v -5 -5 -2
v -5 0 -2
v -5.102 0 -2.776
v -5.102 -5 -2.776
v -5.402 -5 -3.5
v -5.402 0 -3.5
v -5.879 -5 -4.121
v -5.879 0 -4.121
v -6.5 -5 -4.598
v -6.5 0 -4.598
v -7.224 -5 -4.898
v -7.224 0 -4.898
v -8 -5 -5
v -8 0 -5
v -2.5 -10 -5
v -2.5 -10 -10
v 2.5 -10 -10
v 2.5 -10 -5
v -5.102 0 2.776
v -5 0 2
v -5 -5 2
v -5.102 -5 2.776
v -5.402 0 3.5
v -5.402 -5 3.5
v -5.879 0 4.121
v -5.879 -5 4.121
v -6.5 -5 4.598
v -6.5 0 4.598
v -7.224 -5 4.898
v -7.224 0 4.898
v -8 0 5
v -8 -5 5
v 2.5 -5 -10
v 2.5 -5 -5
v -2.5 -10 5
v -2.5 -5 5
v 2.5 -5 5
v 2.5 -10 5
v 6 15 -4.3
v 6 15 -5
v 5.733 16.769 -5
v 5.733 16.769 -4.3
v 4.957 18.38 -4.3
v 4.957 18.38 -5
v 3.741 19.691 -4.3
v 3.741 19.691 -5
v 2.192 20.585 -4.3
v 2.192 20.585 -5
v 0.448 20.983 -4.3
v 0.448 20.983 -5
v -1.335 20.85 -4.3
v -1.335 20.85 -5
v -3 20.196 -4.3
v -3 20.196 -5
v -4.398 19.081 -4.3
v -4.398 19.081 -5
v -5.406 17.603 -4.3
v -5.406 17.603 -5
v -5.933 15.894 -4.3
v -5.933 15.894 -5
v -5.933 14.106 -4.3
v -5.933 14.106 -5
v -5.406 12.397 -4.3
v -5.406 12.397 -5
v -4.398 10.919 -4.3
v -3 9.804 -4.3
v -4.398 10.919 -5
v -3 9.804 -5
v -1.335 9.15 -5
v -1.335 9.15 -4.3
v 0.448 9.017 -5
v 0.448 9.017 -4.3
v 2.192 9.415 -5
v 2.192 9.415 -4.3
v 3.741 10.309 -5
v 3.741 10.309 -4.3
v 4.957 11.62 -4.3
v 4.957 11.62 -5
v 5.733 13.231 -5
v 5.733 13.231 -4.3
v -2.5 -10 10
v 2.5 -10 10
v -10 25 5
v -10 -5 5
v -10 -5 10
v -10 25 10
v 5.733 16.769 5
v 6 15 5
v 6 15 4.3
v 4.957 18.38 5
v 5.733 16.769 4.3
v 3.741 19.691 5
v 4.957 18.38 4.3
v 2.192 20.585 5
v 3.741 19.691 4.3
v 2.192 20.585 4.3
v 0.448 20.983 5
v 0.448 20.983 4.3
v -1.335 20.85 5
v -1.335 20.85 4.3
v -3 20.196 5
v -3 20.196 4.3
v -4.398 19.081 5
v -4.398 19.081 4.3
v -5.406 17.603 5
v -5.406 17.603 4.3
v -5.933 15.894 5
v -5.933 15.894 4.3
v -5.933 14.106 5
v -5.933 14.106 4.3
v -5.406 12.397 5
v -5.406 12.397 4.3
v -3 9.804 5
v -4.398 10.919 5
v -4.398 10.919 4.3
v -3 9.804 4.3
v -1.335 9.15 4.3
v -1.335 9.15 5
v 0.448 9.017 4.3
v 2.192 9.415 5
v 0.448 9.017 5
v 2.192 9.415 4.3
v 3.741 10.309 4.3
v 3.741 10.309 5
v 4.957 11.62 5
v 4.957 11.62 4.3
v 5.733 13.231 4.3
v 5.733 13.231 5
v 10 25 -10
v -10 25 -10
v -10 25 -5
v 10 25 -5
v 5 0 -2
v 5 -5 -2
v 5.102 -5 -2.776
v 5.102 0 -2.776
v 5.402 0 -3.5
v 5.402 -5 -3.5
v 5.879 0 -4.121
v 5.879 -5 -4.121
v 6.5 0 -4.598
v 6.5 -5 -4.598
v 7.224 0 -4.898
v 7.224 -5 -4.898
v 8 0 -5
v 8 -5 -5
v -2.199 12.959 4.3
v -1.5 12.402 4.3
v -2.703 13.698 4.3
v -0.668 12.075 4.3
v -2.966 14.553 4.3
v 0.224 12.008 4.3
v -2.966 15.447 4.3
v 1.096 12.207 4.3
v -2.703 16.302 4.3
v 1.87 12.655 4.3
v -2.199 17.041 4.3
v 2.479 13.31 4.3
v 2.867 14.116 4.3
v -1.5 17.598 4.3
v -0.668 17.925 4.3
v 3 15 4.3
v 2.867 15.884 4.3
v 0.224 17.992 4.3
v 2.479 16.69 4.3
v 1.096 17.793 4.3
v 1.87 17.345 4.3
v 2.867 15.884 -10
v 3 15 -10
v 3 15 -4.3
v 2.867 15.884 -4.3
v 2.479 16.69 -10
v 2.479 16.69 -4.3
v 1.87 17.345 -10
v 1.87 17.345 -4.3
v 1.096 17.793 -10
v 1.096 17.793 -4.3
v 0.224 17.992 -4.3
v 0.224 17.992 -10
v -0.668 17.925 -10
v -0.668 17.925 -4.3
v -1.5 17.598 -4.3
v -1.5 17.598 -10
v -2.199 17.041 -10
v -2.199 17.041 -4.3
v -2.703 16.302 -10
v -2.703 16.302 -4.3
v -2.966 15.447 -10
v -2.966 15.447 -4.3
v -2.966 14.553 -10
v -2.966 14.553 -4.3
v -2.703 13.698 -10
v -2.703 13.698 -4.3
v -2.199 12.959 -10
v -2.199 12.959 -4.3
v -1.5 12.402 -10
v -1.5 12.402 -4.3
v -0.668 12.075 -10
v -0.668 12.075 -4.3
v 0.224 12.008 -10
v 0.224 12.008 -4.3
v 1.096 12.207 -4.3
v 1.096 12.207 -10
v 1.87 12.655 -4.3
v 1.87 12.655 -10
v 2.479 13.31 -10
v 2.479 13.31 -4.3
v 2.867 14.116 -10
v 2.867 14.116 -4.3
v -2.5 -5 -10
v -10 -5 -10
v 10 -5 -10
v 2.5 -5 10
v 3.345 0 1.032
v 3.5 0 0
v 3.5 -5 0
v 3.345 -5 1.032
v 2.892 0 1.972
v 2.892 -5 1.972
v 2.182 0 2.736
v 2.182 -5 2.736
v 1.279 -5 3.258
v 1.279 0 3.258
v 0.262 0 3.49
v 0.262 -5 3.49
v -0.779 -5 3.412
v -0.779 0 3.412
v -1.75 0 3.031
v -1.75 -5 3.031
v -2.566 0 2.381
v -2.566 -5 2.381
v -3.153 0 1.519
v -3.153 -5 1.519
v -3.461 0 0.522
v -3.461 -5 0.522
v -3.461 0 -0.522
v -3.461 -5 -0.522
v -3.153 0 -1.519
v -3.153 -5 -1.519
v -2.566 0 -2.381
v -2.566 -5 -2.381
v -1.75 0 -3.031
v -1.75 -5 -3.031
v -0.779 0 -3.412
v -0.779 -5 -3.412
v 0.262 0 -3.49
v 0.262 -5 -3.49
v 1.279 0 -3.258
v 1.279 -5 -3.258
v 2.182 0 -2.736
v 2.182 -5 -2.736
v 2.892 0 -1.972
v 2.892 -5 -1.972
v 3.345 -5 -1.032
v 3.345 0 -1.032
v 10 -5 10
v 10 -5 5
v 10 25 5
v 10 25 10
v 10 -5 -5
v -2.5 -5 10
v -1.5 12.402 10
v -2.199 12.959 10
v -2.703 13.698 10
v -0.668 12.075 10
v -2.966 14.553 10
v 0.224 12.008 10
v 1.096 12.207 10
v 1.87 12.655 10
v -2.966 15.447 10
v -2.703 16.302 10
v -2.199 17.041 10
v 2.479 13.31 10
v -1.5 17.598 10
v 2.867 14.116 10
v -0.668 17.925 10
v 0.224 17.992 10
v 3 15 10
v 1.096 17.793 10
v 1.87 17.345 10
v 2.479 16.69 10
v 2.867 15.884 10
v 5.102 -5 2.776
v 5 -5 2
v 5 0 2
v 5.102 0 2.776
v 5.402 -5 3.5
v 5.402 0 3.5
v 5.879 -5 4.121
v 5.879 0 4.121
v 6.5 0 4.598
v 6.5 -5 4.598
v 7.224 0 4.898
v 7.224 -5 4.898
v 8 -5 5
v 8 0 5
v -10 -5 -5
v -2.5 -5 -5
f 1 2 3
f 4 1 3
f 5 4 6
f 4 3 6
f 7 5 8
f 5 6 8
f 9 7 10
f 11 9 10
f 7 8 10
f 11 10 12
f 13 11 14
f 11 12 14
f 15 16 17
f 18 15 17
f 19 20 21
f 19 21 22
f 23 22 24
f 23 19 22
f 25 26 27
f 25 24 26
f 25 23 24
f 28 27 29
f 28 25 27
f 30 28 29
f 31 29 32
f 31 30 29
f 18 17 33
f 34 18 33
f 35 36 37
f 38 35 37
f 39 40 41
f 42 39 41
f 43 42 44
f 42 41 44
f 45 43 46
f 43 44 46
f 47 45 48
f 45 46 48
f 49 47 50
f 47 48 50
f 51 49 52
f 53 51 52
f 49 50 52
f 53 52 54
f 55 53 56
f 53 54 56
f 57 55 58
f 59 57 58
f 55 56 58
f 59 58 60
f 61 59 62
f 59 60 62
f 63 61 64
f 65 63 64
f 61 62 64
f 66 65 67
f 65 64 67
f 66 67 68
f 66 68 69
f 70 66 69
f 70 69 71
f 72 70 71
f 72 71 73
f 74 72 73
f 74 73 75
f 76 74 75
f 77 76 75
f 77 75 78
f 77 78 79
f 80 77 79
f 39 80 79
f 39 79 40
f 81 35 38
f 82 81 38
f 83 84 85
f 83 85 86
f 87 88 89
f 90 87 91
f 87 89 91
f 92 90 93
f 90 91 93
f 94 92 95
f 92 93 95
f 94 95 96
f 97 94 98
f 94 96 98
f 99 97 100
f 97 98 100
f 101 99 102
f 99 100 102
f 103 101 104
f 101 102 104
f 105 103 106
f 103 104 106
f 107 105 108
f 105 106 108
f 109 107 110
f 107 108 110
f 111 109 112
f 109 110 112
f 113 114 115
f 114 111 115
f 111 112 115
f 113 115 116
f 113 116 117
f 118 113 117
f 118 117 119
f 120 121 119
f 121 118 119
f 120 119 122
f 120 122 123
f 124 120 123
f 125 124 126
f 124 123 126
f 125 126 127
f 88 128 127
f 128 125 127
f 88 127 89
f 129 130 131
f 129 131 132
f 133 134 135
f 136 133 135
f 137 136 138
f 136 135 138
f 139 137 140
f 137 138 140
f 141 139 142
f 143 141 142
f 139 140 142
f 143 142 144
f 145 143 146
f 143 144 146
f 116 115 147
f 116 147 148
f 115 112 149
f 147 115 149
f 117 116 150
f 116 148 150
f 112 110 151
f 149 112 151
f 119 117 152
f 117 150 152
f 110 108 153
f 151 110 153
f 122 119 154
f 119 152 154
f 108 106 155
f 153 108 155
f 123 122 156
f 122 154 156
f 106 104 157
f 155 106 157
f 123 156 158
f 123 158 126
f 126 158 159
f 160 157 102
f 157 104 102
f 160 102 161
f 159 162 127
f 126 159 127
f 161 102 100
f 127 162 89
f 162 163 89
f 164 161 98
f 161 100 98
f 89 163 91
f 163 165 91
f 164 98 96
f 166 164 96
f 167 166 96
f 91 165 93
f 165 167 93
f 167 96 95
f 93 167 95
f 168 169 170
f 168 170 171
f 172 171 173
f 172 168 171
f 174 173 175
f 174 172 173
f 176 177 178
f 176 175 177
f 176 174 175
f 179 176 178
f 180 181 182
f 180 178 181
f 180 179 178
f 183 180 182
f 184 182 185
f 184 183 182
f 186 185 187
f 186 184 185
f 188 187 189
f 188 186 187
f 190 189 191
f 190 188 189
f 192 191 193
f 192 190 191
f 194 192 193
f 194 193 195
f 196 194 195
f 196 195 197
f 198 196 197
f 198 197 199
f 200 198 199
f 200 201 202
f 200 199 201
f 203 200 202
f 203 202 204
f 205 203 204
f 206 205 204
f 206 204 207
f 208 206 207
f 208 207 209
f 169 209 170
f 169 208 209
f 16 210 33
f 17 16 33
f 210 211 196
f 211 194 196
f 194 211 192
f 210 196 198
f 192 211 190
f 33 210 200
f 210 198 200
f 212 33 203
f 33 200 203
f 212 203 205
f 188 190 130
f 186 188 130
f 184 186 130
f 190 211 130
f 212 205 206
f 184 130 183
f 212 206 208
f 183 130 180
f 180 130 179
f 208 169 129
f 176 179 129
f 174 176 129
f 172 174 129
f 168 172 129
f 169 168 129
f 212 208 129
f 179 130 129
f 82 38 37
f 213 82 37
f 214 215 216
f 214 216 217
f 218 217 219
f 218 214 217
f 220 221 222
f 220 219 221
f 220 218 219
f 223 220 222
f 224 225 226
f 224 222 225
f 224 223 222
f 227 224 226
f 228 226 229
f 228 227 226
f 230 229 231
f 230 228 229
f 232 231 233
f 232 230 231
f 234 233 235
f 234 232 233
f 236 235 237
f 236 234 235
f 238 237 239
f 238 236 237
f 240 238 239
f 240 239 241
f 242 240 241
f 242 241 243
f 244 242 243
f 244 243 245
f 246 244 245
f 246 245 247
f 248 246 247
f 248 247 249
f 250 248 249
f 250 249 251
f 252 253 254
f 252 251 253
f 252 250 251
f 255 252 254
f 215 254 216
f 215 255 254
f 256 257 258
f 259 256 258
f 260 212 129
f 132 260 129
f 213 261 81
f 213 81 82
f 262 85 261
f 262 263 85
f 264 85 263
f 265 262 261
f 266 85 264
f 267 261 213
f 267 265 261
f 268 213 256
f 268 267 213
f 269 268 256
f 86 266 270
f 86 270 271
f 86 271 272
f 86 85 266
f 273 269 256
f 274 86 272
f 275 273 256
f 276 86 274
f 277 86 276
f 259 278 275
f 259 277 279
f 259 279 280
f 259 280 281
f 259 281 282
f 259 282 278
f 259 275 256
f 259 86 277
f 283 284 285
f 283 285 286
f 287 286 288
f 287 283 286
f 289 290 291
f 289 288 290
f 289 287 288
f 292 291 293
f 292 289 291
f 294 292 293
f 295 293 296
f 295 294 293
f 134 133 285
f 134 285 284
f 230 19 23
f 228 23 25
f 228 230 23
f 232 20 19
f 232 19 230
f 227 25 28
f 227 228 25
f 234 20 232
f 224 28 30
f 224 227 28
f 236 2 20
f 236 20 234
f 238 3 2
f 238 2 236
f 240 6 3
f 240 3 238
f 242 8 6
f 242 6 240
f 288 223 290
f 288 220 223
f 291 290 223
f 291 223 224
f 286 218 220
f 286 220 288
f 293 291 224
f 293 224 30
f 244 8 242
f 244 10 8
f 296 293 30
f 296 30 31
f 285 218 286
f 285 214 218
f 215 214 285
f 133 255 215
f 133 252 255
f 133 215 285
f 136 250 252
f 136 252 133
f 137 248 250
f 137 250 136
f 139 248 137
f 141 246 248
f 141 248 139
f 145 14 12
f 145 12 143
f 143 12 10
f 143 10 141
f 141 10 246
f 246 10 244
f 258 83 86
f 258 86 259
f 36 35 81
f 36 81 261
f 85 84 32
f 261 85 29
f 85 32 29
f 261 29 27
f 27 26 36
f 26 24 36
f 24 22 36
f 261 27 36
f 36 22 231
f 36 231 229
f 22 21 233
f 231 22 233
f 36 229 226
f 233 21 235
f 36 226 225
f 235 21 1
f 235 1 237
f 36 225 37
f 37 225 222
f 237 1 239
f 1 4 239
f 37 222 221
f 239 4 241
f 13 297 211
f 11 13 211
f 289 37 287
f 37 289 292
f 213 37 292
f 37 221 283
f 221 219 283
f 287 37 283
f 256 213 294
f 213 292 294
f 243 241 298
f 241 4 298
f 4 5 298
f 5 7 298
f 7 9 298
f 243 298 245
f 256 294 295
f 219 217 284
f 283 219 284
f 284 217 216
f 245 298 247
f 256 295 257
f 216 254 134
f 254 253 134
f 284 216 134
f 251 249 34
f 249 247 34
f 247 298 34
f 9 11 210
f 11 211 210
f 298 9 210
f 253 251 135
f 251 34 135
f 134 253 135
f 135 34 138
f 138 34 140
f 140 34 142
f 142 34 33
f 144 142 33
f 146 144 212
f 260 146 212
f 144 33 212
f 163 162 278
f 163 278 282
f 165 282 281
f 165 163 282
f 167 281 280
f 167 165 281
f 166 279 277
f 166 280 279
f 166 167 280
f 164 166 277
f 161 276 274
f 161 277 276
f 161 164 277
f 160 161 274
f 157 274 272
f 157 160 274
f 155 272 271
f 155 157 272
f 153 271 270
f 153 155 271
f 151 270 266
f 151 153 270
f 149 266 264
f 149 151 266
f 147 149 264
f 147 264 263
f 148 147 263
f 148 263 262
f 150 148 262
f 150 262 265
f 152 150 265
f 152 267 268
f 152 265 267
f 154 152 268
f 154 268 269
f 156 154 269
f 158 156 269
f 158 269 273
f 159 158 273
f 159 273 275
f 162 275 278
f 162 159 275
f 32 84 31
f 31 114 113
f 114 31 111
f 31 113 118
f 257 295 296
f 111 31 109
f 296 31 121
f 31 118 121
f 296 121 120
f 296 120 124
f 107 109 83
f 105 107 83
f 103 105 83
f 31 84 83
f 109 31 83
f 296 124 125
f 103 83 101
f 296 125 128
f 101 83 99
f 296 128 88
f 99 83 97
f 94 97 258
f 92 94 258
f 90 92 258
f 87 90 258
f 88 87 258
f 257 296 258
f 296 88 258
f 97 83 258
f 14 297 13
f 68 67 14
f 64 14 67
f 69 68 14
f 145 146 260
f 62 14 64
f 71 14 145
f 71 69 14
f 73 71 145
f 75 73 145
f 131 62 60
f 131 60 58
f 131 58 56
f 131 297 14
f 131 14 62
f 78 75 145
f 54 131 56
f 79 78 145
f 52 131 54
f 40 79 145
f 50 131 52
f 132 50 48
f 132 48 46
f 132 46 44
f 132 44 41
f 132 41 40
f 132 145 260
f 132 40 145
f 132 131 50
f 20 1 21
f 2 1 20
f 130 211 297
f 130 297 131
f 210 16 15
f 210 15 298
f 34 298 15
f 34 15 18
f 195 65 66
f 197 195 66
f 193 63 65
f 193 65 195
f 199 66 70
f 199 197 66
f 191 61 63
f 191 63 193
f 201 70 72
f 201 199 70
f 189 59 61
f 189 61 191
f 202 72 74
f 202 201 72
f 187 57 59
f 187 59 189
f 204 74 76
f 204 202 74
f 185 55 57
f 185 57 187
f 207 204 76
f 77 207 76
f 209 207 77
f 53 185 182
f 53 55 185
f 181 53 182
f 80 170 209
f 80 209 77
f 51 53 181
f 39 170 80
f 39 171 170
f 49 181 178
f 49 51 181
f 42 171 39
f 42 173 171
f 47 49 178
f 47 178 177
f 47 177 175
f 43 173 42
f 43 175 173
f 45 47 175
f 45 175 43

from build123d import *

# Parameters (mm, degrees)
BOX007_W              = 11
BOX007_H              = 7
BOX007_DEPTH          = 10
FILLET_R              = 3
ARRAY_COUNT           = 2
ARRAY_ANGLE           = 180
ARRAY_PLACEMENT_ANGLE = 90
CYLINDER004_R         = 3
CYLINDER004_DEPTH     = 30
CYLINDER_R            = 3.5
CYLINDER_DEPTH        = 15
CYLINDER006_R         = 6
CYLINDER006_DEPTH     = 4
CYLINDER005_R         = 6
CYLINDER005_DEPTH     = 4
BOX001_W              = 5
BOX001_H              = 10
BOX001_DEPTH          = 5
BOX002_W              = 20
BOX002_H              = 25
BOX002_DEPTH          = 5
BOX_W                 = 20
BOX_H                 = 5
BOX_DEPTH             = 20


with BuildPart() as array:
    # Box007 → Box007 (new body)
    with BuildSketch(Plane(origin=(10, 5, -5), x_dir=(1, 0, 0), z_dir=(0, 0, 1))):
        with Locations((5.5, 3.5)):
            Rectangle(BOX007_W, BOX007_H)
    extrude(amount=BOX007_DEPTH)


with BuildPart() as array_1:
    # BaseFeature placement: moved
    add(array.part.moved(Location((-10, -5, 5))))

    # Fillet
    fillet_edges = [array_1.edges().sort_by_distance(p)[0] for p in [
        (5.5, 0, 10),
        (5.5, 0, 0),
    ]]
    fillet(fillet_edges, radius=FILLET_R)


with BuildPart() as array_2:
    # Body placement: moved
    add(array_1.part.moved(Location((-5, 5, 0))))

    # Array: Array ×2 about axis
    array_axis = Axis((0, 0, 0), (0, 0, 1))


with BuildPart() as array_3:
    add(array_2.part)
    for i in range(1, ARRAY_COUNT):
        add(array_2.part.rotate(array_axis, i * ARRAY_ANGLE / (ARRAY_COUNT - 1)))


with BuildPart() as array_4:
    # Array placement: moved
    add(array_3.part.moved(Location((0, -3, -5))).rotate(Axis((0, -3, -5), (0, 0, 1)), ARRAY_PLACEMENT_ANGLE))


with BuildPart() as cilindro004:
    # Cylinder004 → Cylinder004 (new body)
    with BuildSketch(Plane(origin=(0, 15, -15), x_dir=(1, 0, 0), z_dir=(0, 0, 1))):
        Circle(CYLINDER004_R)
    extrude(amount=CYLINDER004_DEPTH)


with BuildPart() as cilindro:
    # Cylinder → Cylinder (new body)
    with BuildSketch(Plane.XZ.offset(-5)):
        Circle(CYLINDER_R)
    extrude(amount=CYLINDER_DEPTH)


with BuildPart() as apoyo1:
    # Cylinder006 → Cylinder006 (new body)
    with BuildSketch(Plane.XY.offset(4.3)):
        Circle(CYLINDER006_R)
    extrude(amount=CYLINDER006_DEPTH)


with BuildPart() as fusion003:
    # Cylinder005 → Cylinder005 (new body)
    with BuildSketch(Plane.XY.offset(-8.3)):
        Circle(CYLINDER005_R)
    extrude(amount=CYLINDER005_DEPTH)

    # Fusion003: union apoyo1
    add(apoyo1.part)


with BuildPart() as fusion003_1:
    # Fusion003 placement: moved
    add(fusion003.part.moved(Location((0, 15, 0))))


with BuildPart() as pin0:
    # Box001 → Box001 (new body)
    with BuildSketch(Plane(origin=(-2.5, -10, 5), x_dir=(1, 0, 0), z_dir=(0, 0, 1))):
        with Locations((2.5, 5)):
            Rectangle(BOX001_W, BOX001_H)
    extrude(amount=BOX001_DEPTH)


with BuildPart() as pin001:
    # Clone base: copy of pin0
    add(pin0.part)


with BuildPart() as pin001_1:
    # Clone placement: moved
    add(pin001.part.moved(Location((0, 0, -15))))


with BuildPart() as pared1:
    # Box002 → Box002 (new body)
    with BuildSketch(Plane(origin=(-10, 0, 5), x_dir=(1, 0, 0), z_dir=(0, 0, 1))):
        with Locations((10, 12.5)):
            Rectangle(BOX002_W, BOX002_H)
    extrude(amount=BOX002_DEPTH)


with BuildPart() as pared002:
    # Clone001 base: copy of pared1
    add(pared1.part)


with BuildPart() as pared002_1:
    # Clone001 placement: moved
    add(pared002.part.moved(Location((0, 0, -15))))


with BuildPart() as cut003:
    # Box → Box (new body)
    with BuildSketch(Plane(origin=(-10, -5, -10), x_dir=(1, 0, 0), z_dir=(0, 0, 1))):
        with Locations((10, 2.5)):
            Rectangle(BOX_W, BOX_H)
    extrude(amount=BOX_DEPTH)

    # Fusion: union pin0, pin001, pared1, pared002
    add(pin0.part)
    add(pin001_1.part)
    add(pared1.part)
    add(pared002_1.part)

    # Fusion004: union Fusion003
    add(fusion003_1.part)

    # Cut001: cut Cilindro
    add(cilindro.part, mode=Mode.SUBTRACT)

    # Cut002: cut Cilindro004
    add(cilindro004.part, mode=Mode.SUBTRACT)

    # Cut003: cut Array
    add(array_4.part, mode=Mode.SUBTRACT)


solid = cut003.part
